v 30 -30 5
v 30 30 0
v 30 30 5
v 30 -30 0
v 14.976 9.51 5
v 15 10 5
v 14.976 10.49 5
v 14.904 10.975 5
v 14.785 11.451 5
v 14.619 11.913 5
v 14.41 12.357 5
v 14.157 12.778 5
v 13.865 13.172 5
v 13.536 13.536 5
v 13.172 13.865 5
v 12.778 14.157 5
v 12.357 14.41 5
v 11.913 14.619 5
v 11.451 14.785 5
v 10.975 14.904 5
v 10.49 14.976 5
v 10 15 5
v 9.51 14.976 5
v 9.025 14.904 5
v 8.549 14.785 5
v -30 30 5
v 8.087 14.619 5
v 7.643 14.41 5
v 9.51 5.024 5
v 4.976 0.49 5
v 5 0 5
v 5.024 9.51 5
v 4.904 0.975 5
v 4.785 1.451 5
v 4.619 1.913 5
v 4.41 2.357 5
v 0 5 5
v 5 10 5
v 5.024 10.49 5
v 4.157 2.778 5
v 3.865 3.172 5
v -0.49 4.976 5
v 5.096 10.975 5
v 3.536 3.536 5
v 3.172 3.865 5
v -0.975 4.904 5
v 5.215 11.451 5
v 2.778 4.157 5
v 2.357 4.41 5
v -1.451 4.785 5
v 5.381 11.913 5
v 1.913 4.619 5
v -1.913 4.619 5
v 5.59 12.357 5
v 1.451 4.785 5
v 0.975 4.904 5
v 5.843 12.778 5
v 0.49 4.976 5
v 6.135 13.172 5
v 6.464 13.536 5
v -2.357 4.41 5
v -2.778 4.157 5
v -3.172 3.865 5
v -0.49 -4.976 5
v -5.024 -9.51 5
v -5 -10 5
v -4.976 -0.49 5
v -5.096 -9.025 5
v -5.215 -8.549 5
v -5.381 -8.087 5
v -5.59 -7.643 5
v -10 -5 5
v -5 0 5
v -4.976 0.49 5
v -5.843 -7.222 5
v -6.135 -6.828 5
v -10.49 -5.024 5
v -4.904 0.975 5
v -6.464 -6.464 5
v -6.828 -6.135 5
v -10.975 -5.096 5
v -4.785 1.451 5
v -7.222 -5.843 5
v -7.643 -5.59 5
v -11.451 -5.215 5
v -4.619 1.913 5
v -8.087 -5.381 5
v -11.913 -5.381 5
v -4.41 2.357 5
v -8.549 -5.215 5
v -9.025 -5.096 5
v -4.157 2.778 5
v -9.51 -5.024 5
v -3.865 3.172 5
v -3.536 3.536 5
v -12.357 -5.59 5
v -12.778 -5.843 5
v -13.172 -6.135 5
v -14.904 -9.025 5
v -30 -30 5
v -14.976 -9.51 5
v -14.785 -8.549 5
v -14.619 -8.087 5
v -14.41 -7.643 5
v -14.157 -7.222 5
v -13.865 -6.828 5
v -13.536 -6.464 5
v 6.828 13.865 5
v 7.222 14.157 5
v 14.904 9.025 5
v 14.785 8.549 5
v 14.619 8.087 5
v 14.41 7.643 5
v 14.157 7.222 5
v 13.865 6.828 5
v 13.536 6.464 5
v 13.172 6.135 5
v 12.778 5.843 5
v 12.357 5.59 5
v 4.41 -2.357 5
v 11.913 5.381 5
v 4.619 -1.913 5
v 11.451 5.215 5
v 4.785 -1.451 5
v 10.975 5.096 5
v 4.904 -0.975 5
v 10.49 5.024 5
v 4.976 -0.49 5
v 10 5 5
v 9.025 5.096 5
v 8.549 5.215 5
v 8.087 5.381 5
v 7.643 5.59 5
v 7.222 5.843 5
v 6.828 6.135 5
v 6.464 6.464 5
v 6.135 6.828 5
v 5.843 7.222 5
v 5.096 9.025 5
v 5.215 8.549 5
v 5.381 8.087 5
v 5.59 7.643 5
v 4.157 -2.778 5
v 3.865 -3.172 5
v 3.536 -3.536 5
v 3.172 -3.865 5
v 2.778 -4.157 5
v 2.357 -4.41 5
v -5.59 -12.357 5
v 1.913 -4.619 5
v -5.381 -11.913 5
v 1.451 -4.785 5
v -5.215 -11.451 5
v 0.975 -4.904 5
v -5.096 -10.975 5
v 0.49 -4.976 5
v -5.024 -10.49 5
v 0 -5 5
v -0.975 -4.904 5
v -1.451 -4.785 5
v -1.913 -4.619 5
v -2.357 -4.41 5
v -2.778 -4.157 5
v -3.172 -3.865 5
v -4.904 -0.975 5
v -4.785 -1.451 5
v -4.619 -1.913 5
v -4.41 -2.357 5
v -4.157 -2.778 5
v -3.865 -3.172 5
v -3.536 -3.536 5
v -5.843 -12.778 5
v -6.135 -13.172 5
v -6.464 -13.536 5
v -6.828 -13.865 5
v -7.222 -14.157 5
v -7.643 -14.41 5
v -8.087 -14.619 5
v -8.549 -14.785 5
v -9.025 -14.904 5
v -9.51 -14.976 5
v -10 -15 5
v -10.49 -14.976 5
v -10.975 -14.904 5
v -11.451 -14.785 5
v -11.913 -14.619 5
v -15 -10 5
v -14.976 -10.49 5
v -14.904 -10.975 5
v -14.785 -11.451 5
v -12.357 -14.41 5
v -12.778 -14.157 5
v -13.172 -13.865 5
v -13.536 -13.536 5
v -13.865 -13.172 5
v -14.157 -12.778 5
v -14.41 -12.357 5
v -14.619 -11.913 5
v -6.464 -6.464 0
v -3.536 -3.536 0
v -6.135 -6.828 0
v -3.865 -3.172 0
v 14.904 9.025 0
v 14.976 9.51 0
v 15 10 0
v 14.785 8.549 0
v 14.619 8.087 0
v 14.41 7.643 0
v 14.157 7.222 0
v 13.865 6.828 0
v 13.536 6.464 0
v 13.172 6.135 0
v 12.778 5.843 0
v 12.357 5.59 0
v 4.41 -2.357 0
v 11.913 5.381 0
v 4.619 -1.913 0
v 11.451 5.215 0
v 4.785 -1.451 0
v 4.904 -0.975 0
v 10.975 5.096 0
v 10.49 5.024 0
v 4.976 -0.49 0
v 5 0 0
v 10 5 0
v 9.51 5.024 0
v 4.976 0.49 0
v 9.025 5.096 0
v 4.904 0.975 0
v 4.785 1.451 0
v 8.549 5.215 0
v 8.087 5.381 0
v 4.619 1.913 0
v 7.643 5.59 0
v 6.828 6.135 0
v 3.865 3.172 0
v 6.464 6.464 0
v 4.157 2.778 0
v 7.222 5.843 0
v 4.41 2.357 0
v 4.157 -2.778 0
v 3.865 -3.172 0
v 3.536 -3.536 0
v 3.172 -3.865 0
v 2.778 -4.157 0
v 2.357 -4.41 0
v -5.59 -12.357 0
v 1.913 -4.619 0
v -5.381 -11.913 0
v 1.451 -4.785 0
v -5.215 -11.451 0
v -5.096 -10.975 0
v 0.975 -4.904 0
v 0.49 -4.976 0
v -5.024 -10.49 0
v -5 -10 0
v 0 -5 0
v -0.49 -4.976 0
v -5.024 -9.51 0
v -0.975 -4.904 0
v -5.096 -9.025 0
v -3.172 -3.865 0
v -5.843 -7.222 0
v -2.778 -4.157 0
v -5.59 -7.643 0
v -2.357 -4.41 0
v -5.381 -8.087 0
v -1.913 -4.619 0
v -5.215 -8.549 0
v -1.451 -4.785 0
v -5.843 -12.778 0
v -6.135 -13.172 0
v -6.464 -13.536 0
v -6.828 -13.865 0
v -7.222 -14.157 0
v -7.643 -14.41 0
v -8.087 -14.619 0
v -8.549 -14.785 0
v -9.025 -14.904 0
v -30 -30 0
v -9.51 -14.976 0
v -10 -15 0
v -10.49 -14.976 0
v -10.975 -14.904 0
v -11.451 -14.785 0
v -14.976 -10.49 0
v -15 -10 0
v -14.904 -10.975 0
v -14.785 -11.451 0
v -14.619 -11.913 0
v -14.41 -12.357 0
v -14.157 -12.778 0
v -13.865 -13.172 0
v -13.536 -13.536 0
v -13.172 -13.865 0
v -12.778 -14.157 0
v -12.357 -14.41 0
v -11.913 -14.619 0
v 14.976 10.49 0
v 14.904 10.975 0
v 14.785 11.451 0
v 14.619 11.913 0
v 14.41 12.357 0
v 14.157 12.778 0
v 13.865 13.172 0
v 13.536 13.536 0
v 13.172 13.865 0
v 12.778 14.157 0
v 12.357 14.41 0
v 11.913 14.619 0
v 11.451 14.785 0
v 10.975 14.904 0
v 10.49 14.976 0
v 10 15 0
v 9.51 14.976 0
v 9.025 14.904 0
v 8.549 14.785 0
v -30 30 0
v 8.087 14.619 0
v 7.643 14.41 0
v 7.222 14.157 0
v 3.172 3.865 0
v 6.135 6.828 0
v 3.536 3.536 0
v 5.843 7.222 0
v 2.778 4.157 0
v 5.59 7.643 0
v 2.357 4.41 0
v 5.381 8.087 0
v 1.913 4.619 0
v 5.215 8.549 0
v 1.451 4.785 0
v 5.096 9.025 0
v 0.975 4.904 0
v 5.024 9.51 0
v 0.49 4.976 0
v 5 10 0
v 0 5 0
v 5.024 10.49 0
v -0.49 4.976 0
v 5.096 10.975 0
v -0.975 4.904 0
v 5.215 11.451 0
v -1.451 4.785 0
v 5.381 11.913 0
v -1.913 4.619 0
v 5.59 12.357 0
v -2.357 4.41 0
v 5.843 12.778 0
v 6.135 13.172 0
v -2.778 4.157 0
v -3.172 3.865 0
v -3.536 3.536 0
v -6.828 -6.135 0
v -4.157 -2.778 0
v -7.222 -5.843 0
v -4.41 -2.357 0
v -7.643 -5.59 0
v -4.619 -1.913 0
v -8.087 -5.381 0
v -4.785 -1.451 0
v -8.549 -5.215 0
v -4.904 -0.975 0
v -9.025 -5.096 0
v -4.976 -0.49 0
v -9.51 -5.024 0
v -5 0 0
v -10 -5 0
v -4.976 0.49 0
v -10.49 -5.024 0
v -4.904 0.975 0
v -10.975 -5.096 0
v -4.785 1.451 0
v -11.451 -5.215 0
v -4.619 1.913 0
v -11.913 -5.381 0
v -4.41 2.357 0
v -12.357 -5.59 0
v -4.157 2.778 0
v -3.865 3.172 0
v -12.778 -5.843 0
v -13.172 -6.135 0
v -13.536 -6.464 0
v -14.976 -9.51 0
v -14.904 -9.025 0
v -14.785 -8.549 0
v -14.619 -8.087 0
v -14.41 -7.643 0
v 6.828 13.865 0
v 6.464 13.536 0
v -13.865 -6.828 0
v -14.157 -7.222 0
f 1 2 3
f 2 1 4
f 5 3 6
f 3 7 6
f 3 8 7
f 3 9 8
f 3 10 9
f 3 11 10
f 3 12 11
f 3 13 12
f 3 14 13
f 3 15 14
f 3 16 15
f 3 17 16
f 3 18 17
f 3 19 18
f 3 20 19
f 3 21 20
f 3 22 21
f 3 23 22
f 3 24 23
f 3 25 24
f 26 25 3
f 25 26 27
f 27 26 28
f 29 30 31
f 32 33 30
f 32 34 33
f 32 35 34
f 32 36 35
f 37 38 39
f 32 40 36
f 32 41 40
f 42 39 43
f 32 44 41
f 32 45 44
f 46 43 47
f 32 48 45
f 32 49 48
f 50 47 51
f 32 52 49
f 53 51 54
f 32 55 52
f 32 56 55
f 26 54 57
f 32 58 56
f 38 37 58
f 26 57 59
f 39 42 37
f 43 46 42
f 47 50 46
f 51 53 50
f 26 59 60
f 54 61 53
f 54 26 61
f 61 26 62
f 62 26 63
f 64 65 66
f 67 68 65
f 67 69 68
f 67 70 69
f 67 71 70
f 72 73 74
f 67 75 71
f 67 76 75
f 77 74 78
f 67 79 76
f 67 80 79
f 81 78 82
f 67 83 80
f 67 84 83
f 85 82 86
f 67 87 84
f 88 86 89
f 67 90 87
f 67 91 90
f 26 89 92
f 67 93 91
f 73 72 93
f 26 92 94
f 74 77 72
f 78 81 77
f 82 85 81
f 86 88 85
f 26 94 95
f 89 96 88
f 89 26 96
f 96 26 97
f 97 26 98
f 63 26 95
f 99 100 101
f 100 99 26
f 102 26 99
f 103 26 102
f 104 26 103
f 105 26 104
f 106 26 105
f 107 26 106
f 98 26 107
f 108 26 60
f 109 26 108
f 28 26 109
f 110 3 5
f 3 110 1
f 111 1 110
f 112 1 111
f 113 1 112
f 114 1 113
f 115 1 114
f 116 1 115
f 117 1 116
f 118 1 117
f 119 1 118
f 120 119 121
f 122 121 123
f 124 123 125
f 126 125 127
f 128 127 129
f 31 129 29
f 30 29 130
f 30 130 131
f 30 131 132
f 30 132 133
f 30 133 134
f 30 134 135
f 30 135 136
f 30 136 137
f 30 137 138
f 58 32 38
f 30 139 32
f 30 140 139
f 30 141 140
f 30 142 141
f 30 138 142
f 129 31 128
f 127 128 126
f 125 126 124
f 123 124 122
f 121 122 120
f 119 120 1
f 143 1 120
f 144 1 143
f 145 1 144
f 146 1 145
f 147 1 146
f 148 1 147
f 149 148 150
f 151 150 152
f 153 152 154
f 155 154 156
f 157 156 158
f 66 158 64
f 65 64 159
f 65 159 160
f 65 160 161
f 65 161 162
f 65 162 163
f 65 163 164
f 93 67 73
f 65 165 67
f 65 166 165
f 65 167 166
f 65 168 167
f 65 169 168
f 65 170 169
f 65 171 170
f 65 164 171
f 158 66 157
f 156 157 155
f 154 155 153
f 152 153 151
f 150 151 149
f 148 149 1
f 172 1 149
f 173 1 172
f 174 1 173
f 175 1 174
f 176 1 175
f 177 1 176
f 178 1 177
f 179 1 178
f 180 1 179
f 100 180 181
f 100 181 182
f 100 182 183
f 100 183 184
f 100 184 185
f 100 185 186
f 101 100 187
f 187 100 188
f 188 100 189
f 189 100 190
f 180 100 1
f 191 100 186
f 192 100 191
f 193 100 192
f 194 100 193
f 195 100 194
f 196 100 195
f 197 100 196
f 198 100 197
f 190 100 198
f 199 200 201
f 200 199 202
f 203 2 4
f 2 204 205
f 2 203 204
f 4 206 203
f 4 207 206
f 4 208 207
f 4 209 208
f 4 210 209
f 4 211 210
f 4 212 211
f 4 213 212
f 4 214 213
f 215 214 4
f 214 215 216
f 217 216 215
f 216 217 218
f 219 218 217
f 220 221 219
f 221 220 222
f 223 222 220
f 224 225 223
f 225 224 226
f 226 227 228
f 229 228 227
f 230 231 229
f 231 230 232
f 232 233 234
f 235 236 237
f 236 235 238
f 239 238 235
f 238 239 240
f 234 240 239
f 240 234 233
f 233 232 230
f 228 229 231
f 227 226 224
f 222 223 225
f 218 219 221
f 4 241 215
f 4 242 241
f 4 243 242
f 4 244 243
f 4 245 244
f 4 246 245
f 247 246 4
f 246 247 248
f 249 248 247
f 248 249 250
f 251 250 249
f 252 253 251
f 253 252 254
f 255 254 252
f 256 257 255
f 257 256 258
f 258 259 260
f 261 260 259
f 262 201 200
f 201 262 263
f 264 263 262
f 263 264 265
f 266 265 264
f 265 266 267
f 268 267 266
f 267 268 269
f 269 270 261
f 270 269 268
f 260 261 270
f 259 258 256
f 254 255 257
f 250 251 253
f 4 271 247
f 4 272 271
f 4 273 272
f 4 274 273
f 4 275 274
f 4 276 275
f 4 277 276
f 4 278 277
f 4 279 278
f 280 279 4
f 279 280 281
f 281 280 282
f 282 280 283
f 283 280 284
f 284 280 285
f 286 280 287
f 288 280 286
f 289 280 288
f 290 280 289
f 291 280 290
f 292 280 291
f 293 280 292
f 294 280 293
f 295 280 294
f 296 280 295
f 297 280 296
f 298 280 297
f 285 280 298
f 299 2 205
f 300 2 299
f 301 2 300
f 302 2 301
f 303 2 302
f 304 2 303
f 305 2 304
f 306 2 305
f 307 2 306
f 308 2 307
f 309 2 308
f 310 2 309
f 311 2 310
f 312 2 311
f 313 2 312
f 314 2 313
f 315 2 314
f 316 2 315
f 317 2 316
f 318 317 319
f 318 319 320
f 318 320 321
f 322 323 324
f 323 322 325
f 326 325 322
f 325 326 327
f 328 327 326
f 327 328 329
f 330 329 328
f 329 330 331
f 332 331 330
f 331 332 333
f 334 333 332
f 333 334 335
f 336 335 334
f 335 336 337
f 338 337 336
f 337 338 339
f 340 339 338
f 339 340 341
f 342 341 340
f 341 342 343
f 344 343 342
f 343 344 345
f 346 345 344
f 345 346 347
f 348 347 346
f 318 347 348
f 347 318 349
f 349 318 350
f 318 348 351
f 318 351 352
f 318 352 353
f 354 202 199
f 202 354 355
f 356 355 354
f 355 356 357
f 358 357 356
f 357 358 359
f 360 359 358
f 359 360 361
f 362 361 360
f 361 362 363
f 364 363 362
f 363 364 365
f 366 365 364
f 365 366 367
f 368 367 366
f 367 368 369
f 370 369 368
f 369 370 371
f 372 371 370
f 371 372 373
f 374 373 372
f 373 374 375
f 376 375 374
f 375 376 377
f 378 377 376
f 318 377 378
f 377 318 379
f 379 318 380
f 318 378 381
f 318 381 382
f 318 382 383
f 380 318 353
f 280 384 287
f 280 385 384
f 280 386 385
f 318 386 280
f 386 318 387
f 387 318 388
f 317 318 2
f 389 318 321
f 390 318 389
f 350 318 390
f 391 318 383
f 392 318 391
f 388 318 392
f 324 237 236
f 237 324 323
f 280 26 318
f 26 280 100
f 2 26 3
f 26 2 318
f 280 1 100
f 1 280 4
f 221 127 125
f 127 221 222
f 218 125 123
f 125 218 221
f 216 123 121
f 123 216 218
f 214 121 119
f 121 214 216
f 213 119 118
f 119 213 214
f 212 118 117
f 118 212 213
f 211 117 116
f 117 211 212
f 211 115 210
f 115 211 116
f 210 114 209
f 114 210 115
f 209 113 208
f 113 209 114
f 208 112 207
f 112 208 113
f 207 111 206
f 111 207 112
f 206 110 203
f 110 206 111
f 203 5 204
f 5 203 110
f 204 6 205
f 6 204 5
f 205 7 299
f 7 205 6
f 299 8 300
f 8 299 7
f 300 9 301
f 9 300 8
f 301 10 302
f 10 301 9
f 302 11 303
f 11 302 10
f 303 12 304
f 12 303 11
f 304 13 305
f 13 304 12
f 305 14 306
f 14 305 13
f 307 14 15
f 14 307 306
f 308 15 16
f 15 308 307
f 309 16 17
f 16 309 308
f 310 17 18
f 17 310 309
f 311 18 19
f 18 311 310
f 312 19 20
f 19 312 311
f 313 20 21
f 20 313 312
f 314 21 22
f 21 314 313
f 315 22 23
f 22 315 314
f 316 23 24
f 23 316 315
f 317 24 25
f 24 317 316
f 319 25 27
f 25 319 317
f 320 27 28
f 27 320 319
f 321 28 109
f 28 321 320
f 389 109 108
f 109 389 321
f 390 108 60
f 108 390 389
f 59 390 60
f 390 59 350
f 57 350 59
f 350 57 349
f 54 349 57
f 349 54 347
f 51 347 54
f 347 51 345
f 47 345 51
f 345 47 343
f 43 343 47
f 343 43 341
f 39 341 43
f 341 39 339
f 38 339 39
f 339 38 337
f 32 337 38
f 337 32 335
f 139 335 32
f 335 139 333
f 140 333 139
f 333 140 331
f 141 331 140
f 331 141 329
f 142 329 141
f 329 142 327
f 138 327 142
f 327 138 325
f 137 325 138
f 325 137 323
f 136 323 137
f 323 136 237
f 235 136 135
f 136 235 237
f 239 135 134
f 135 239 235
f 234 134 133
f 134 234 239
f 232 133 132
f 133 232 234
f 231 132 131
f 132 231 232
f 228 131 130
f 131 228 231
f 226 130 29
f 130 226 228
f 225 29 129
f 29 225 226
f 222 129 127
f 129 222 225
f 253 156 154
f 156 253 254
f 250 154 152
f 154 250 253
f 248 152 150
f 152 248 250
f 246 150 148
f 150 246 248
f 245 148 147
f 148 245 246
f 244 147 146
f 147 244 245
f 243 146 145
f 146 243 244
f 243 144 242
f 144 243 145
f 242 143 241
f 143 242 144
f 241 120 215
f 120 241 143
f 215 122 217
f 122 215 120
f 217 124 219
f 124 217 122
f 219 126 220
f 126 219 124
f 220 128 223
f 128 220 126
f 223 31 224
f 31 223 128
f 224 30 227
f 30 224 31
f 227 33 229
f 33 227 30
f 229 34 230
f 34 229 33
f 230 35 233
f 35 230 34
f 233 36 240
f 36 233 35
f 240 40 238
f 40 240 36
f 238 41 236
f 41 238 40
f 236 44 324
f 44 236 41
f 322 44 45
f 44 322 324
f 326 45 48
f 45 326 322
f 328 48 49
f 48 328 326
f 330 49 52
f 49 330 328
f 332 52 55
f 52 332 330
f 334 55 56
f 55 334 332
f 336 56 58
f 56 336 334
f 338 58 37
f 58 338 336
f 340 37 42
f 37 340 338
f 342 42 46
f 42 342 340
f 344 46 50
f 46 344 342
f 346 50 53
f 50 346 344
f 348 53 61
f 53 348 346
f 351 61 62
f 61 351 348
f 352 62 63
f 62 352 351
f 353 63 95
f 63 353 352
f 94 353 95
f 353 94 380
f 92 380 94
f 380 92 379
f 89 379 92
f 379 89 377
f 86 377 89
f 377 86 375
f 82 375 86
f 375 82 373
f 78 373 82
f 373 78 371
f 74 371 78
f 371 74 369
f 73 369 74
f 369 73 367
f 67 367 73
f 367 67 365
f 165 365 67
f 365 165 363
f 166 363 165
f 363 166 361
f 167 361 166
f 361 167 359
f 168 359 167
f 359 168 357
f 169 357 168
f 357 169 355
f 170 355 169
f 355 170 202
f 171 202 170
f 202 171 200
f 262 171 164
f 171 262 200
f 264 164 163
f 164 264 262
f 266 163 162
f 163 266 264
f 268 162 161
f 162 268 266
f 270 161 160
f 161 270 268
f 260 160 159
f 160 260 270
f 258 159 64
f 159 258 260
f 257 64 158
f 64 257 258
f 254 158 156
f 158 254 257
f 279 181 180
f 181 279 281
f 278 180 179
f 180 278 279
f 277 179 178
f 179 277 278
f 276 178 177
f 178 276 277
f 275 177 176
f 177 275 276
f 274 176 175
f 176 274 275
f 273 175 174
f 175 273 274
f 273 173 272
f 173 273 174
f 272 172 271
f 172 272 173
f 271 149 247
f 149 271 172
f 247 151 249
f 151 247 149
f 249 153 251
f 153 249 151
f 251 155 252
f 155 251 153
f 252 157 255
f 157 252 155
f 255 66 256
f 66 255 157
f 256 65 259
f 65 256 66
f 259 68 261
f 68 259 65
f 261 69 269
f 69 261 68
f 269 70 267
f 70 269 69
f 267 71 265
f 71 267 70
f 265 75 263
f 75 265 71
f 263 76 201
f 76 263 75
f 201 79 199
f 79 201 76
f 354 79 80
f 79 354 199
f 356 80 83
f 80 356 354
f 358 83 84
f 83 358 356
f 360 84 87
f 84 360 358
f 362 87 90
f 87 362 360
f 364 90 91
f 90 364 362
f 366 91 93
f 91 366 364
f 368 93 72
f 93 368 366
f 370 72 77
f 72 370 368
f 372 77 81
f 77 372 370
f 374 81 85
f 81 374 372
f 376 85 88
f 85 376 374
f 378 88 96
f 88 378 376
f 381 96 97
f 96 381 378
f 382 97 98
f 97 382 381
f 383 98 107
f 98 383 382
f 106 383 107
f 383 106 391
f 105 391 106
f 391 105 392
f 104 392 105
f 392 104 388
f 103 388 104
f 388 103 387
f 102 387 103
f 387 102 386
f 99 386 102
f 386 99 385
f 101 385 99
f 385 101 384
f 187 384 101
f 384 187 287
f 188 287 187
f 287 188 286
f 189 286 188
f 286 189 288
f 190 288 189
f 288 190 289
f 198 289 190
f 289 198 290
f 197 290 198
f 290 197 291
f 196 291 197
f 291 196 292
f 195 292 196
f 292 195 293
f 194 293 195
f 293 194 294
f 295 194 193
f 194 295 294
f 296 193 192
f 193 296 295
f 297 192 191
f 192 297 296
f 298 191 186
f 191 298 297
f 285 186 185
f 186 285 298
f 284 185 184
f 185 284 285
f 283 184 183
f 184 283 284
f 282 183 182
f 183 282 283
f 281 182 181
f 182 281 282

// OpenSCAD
module ExtrudeExample(){
  difference(){
    translate([-30, -30, 0])cube([60, 60, 5]);
    translate([0, 0, -0.004])linear_extrude(height=5.008)union(){
          circle(d=10,$fn=64);
          translate([10, 10, 0])circle(d=10,$fn=64);
          translate([-10, -10, 0])circle(d=10,$fn=64);
        }

  }
}
$fn=64;
color("SteelBlue")ExtrudeExample();
